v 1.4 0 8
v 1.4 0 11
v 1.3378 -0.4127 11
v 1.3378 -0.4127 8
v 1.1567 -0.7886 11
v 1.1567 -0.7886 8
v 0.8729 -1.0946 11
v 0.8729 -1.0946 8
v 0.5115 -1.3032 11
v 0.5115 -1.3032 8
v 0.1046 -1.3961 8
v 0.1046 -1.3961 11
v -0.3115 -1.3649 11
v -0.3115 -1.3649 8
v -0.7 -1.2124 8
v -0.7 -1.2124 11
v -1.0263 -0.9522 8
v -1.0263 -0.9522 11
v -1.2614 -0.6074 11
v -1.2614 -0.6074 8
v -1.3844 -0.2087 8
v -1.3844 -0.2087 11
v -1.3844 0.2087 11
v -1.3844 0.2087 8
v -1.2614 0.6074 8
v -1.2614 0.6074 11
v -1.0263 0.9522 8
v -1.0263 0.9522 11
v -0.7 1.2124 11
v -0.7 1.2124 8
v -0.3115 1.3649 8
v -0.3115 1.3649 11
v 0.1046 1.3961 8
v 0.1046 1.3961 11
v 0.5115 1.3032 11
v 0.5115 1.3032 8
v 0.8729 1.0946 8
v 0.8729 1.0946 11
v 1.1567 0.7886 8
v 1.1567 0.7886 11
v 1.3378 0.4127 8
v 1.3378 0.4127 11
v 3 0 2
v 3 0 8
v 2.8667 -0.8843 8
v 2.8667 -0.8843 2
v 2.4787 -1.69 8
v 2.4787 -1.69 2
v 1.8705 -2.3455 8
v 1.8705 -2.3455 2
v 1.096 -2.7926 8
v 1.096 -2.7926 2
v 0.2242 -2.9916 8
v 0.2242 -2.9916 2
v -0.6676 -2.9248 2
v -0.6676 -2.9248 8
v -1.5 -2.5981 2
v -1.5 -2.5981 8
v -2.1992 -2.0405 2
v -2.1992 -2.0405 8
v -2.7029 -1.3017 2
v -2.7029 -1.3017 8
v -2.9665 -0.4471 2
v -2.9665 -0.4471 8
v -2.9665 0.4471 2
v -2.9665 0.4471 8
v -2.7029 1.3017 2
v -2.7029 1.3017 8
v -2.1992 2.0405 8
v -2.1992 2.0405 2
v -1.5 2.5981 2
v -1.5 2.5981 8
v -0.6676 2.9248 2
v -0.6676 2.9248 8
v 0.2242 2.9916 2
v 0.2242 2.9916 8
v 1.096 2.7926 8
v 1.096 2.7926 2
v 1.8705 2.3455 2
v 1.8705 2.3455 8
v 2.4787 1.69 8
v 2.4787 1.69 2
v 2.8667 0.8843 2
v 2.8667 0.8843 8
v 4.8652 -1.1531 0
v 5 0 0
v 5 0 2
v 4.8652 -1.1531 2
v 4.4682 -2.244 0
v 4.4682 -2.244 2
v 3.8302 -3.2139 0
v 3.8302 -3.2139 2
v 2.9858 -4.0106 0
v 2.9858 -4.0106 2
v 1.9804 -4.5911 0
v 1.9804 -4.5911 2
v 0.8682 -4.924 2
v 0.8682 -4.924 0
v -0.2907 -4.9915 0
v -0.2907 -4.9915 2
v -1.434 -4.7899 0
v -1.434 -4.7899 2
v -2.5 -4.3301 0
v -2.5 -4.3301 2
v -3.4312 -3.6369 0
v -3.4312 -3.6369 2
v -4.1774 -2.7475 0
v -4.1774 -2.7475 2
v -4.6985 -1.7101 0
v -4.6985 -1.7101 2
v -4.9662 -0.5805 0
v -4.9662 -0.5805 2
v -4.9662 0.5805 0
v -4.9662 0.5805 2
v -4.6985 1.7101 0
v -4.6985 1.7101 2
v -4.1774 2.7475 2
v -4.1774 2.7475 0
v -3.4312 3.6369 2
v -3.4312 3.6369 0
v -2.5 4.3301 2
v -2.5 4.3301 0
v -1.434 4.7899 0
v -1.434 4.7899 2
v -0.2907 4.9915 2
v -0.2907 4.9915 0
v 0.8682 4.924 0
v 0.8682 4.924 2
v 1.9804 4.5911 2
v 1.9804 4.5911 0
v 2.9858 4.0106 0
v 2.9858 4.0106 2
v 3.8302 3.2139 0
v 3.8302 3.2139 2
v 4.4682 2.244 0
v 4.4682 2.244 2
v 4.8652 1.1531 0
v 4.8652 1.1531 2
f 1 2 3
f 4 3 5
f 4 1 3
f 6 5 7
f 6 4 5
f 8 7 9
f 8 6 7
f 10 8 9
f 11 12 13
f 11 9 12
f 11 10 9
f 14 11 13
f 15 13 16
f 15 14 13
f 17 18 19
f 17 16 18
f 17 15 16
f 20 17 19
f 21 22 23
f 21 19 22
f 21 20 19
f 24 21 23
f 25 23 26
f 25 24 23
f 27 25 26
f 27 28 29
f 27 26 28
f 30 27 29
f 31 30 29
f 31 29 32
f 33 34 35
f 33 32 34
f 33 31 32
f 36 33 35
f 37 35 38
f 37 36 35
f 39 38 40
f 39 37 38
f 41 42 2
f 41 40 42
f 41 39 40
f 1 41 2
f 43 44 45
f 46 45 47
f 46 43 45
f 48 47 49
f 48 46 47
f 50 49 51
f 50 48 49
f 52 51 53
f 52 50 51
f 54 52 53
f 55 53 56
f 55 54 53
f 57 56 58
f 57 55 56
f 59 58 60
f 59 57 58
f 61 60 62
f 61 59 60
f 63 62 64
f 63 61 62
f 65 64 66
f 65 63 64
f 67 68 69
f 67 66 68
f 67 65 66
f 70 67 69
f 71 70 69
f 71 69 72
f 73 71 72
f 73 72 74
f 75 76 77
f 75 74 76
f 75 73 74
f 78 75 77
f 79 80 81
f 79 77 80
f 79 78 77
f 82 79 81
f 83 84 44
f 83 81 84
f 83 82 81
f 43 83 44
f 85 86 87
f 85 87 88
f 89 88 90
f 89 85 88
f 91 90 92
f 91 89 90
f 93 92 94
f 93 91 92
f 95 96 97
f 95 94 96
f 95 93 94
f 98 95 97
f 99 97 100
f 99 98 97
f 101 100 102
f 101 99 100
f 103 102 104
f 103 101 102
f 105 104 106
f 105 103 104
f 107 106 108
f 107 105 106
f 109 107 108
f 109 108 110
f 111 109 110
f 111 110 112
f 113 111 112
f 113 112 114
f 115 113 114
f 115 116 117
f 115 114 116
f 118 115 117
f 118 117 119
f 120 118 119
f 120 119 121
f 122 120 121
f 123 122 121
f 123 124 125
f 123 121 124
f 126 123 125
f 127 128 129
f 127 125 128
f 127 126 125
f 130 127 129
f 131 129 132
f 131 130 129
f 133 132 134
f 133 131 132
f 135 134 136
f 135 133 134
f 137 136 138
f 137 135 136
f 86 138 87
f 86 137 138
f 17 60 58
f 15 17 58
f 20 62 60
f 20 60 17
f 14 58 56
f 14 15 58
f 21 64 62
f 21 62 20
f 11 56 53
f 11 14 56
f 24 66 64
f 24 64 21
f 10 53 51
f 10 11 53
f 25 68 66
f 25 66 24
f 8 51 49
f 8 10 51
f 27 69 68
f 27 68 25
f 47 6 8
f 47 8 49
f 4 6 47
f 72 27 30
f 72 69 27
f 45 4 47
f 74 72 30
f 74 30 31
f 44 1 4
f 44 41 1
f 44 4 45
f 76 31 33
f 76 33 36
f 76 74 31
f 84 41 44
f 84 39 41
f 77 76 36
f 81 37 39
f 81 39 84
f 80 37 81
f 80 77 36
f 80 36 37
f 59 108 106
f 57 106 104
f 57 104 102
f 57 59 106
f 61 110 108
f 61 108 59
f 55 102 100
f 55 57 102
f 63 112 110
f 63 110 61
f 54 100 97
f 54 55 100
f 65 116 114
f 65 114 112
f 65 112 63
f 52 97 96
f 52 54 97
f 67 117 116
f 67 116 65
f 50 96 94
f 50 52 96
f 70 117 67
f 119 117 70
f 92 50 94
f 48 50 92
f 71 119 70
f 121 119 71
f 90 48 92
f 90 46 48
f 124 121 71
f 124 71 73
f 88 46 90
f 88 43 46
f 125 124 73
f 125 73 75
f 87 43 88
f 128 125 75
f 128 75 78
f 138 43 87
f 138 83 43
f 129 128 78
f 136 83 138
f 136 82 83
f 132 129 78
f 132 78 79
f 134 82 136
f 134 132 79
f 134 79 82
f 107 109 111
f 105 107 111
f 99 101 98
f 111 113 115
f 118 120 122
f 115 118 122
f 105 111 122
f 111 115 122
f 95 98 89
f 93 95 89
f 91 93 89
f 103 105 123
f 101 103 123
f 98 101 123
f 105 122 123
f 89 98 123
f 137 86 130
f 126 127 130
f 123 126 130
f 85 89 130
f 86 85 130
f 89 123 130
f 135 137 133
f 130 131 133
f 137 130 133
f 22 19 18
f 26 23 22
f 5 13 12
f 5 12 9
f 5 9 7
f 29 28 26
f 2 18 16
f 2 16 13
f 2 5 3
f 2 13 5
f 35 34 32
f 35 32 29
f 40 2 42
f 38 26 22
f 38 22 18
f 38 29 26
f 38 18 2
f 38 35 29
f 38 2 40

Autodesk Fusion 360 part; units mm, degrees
sketch "Sketch1" plane through (0, 0, 0) normal (0, 0, 1) x (1, 0, 0)
  circle A0 centre (0, 0) radius 5
  circle A1 centre (0, 0) radius 3
  circle A2 centre (0, 0) radius 1.4
  dimension "d1" = 10
  dimension "d2" = 6
  dimension "d3" = 2.8
extrude "Extrude1" add sketch "Sketch1" along normal blind 2 contours A0 | A1 | A2
extrude "Extrude2" add sketch "Sketch1" along normal blind 8 contours A1 | A2
extrude "Extrude3" add sketch "Sketch1" along normal blind 11 contours A2
